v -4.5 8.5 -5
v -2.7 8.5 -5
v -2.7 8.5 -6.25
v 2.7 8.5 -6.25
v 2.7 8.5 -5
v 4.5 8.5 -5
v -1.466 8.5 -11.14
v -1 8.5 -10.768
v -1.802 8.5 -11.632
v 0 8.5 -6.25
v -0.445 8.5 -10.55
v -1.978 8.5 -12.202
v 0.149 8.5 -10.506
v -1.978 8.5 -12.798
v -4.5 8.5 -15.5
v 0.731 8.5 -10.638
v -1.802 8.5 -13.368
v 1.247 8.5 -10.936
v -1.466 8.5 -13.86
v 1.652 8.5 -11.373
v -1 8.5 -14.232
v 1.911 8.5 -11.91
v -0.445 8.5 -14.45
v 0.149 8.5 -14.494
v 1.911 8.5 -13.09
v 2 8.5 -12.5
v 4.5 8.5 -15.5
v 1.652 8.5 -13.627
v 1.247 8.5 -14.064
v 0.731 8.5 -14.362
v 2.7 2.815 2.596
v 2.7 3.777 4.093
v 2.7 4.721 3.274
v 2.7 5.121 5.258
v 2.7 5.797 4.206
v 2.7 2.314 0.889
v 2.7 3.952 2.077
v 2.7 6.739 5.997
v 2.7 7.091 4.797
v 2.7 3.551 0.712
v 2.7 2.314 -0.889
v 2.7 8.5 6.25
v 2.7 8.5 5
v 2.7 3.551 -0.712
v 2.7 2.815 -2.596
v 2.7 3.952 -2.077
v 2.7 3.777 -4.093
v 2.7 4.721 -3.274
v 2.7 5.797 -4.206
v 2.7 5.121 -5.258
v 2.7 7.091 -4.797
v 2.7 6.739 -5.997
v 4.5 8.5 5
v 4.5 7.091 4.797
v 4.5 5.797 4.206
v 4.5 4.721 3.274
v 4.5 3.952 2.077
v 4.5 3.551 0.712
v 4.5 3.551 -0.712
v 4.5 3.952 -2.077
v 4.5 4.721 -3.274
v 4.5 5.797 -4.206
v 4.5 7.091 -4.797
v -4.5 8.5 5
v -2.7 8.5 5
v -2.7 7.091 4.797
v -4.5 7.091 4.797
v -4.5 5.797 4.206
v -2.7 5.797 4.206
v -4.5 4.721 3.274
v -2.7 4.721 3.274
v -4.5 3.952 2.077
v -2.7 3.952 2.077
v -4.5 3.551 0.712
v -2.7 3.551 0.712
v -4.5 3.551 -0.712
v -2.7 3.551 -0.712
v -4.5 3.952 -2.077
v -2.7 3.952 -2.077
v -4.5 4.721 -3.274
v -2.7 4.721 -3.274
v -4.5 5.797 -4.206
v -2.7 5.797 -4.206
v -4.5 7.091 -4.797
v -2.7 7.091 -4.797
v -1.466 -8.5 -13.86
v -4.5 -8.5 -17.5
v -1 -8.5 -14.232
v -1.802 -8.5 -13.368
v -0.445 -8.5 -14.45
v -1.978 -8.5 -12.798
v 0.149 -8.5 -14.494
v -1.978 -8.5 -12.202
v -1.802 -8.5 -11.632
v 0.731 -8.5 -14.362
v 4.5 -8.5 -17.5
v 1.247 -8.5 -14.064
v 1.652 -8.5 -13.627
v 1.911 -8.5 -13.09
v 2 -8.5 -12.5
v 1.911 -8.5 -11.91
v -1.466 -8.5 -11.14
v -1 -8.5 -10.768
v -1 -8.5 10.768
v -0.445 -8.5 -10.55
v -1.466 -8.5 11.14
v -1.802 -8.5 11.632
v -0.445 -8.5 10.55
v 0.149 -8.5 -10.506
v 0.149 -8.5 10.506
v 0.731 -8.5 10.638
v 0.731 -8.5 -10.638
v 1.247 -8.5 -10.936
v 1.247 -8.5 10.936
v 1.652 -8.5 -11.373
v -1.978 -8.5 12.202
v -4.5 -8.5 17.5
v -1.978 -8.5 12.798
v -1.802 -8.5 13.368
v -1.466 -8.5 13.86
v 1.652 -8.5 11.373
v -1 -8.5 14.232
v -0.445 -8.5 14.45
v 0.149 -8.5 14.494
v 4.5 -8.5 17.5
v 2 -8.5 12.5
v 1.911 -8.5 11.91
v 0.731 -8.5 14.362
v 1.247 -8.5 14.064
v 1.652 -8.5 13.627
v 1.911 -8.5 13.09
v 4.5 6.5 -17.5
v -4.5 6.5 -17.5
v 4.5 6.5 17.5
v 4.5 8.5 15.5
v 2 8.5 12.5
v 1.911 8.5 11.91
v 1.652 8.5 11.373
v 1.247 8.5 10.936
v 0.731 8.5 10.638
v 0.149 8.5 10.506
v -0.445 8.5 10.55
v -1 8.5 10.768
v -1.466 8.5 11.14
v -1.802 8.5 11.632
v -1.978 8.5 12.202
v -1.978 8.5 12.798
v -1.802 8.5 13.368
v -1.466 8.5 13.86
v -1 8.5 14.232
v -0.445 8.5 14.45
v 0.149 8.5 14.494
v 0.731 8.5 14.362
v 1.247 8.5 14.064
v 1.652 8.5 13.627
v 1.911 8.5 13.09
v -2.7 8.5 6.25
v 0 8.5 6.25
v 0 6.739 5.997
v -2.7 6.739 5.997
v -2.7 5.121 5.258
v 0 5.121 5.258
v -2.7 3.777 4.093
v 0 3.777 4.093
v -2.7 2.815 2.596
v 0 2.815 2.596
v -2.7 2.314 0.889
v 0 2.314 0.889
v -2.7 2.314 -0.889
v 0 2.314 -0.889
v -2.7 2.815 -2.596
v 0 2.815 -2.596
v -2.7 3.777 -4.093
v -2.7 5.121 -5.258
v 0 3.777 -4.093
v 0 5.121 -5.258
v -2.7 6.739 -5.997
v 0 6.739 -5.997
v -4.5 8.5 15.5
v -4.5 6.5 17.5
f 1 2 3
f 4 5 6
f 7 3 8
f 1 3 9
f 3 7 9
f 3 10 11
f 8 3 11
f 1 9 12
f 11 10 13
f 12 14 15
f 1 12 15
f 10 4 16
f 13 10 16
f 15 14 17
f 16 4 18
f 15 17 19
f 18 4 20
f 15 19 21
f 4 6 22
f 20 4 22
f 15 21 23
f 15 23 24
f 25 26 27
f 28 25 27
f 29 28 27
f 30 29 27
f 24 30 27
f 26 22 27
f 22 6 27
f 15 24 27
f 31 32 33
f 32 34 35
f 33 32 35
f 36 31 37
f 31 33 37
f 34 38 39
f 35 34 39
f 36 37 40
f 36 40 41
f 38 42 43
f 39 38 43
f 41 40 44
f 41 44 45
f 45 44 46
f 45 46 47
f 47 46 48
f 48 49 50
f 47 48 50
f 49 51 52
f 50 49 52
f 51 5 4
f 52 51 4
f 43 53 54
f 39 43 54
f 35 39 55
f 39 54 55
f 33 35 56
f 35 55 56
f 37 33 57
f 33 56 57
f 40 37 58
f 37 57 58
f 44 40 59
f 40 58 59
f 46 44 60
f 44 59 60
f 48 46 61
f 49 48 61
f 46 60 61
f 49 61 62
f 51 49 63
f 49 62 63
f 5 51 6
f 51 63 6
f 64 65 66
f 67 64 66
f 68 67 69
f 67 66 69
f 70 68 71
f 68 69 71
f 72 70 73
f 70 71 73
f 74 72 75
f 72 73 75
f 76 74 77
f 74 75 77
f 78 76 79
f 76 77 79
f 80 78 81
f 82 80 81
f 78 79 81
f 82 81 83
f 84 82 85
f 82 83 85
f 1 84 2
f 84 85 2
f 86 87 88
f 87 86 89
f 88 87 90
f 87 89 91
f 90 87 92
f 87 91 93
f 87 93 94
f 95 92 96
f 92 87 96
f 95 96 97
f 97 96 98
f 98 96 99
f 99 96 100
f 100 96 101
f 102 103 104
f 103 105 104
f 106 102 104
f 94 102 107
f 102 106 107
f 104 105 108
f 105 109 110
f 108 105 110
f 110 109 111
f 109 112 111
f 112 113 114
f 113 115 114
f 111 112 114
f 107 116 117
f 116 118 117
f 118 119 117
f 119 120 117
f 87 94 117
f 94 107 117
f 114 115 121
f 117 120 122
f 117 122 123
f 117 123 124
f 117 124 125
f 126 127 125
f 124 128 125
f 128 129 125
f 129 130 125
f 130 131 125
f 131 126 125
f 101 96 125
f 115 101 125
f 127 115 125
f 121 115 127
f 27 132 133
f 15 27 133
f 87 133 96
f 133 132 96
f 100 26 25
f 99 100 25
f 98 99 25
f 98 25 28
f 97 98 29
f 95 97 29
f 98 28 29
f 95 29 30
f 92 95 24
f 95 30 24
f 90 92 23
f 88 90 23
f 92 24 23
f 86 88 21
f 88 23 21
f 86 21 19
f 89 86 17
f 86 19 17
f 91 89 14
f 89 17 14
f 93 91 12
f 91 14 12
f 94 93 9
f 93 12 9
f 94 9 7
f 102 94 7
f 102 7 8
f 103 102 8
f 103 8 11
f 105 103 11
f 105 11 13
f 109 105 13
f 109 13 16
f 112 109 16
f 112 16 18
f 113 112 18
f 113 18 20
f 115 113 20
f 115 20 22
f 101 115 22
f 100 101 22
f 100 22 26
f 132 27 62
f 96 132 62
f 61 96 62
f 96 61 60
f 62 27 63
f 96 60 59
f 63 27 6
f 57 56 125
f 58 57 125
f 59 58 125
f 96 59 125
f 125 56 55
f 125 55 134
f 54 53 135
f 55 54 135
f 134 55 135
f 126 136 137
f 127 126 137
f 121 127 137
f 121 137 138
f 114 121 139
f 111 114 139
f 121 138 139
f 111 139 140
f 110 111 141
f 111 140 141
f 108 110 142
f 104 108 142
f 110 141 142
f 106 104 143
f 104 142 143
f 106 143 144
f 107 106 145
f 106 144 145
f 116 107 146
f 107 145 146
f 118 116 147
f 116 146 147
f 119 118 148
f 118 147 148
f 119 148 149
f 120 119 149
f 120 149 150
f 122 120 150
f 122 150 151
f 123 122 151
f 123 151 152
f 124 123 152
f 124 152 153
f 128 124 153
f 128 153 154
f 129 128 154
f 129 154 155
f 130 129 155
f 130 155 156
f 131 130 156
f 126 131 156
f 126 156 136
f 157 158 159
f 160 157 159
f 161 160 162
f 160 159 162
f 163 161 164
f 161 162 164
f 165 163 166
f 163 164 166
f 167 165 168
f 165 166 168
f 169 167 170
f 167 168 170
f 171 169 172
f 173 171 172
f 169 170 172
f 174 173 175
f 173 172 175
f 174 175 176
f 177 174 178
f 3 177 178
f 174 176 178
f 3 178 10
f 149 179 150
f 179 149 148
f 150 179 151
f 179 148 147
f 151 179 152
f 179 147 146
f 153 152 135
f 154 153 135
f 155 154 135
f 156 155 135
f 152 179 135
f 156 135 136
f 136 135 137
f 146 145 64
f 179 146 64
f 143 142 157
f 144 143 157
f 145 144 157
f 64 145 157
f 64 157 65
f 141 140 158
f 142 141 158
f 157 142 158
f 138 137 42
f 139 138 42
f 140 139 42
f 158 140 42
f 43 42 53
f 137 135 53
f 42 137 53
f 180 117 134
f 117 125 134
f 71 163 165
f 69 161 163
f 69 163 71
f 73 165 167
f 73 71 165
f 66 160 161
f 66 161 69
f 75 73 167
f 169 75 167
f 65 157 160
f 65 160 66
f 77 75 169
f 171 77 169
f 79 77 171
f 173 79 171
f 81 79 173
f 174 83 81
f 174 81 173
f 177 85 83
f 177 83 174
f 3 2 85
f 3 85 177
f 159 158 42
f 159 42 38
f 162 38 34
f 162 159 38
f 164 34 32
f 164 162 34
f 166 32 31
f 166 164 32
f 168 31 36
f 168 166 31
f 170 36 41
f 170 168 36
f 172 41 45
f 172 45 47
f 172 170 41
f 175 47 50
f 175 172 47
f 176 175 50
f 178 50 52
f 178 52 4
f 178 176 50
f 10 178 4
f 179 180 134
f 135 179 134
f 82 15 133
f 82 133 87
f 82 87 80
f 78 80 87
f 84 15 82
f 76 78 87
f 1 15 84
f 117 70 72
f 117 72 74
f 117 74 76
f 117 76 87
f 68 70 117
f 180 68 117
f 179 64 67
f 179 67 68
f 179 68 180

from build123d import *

# Parameters (mm, degrees)
BOSS_EXTRUDE1_DEPTH      = 4.5
BOSS_EXTRUDE1_DEPTH_BACK = 4.5
CUT_EXTRUDE1_DEPTH       = 2.7
CUT_EXTRUDE1_DEPTH_BACK  = 2.7
SKETCH2_R                = 6.25
SKETCH3_R                = 2
CUT_EXTRUDE3_DEPTH       = 25.80927246
CHAMFER1_SIZE            = 2


with BuildPart() as part:
    # Sketch1 → Boss-Extrude1 (new, two sides: drawn at the far end of the back side and taken through both)
    with BuildSketch(Plane(origin=(0, 0, 0), x_dir=(0, 0, -1), z_dir=(1, 0, 0)).offset(-BOSS_EXTRUDE1_DEPTH_BACK)):
        with BuildLine():
            Line((5, 8.5), (17.5, 8.5))
            Line((17.5, 8.5), (17.5, -8.5))
            Line((17.5, -8.5), (-17.5, -8.5))
            Line((-17.5, -8.5), (-17.5, 8.5))
            Line((-17.5, 8.5), (-5, 8.5))
            ThreePointArc((-5, 8.5), (0, 3.5), (5, 8.5))
        make_face()
    extrude(amount=BOSS_EXTRUDE1_DEPTH + BOSS_EXTRUDE1_DEPTH_BACK)

    # Sketch2 → Cut-Extrude1 (cut, two sides: drawn at the far end of the back side and taken through both)
    with BuildSketch(Plane(origin=(0, 0, 0), x_dir=(0, 0, -1), z_dir=(1, 0, 0)).offset(-CUT_EXTRUDE1_DEPTH_BACK)):
        with Locations((0, 8.5)):
            Circle(SKETCH2_R)
    extrude(amount=CUT_EXTRUDE1_DEPTH + CUT_EXTRUDE1_DEPTH_BACK, mode=Mode.SUBTRACT)

    # Sketch3 → Cut-Extrude3 (cut, through all)
    with BuildSketch(Plane(origin=(0, 8.5, 0), x_dir=(1, 0, 0), z_dir=(0, 1, 0))):
        with Locations((0, 12.5)):
            Circle(SKETCH3_R)
        with Locations((0, -12.5)):
            Circle(SKETCH3_R)
    extrude(amount=-CUT_EXTRUDE3_DEPTH, mode=Mode.SUBTRACT)

    # Chamfer1
    chamfer1_edges = [part.edges().sort_by_distance(p)[0] for p in [
        (0, 8.5, -17.5),
        (0, 8.5, 17.5),
    ]]
    chamfer(chamfer1_edges, length=CHAMFER1_SIZE)


solid = part.part
